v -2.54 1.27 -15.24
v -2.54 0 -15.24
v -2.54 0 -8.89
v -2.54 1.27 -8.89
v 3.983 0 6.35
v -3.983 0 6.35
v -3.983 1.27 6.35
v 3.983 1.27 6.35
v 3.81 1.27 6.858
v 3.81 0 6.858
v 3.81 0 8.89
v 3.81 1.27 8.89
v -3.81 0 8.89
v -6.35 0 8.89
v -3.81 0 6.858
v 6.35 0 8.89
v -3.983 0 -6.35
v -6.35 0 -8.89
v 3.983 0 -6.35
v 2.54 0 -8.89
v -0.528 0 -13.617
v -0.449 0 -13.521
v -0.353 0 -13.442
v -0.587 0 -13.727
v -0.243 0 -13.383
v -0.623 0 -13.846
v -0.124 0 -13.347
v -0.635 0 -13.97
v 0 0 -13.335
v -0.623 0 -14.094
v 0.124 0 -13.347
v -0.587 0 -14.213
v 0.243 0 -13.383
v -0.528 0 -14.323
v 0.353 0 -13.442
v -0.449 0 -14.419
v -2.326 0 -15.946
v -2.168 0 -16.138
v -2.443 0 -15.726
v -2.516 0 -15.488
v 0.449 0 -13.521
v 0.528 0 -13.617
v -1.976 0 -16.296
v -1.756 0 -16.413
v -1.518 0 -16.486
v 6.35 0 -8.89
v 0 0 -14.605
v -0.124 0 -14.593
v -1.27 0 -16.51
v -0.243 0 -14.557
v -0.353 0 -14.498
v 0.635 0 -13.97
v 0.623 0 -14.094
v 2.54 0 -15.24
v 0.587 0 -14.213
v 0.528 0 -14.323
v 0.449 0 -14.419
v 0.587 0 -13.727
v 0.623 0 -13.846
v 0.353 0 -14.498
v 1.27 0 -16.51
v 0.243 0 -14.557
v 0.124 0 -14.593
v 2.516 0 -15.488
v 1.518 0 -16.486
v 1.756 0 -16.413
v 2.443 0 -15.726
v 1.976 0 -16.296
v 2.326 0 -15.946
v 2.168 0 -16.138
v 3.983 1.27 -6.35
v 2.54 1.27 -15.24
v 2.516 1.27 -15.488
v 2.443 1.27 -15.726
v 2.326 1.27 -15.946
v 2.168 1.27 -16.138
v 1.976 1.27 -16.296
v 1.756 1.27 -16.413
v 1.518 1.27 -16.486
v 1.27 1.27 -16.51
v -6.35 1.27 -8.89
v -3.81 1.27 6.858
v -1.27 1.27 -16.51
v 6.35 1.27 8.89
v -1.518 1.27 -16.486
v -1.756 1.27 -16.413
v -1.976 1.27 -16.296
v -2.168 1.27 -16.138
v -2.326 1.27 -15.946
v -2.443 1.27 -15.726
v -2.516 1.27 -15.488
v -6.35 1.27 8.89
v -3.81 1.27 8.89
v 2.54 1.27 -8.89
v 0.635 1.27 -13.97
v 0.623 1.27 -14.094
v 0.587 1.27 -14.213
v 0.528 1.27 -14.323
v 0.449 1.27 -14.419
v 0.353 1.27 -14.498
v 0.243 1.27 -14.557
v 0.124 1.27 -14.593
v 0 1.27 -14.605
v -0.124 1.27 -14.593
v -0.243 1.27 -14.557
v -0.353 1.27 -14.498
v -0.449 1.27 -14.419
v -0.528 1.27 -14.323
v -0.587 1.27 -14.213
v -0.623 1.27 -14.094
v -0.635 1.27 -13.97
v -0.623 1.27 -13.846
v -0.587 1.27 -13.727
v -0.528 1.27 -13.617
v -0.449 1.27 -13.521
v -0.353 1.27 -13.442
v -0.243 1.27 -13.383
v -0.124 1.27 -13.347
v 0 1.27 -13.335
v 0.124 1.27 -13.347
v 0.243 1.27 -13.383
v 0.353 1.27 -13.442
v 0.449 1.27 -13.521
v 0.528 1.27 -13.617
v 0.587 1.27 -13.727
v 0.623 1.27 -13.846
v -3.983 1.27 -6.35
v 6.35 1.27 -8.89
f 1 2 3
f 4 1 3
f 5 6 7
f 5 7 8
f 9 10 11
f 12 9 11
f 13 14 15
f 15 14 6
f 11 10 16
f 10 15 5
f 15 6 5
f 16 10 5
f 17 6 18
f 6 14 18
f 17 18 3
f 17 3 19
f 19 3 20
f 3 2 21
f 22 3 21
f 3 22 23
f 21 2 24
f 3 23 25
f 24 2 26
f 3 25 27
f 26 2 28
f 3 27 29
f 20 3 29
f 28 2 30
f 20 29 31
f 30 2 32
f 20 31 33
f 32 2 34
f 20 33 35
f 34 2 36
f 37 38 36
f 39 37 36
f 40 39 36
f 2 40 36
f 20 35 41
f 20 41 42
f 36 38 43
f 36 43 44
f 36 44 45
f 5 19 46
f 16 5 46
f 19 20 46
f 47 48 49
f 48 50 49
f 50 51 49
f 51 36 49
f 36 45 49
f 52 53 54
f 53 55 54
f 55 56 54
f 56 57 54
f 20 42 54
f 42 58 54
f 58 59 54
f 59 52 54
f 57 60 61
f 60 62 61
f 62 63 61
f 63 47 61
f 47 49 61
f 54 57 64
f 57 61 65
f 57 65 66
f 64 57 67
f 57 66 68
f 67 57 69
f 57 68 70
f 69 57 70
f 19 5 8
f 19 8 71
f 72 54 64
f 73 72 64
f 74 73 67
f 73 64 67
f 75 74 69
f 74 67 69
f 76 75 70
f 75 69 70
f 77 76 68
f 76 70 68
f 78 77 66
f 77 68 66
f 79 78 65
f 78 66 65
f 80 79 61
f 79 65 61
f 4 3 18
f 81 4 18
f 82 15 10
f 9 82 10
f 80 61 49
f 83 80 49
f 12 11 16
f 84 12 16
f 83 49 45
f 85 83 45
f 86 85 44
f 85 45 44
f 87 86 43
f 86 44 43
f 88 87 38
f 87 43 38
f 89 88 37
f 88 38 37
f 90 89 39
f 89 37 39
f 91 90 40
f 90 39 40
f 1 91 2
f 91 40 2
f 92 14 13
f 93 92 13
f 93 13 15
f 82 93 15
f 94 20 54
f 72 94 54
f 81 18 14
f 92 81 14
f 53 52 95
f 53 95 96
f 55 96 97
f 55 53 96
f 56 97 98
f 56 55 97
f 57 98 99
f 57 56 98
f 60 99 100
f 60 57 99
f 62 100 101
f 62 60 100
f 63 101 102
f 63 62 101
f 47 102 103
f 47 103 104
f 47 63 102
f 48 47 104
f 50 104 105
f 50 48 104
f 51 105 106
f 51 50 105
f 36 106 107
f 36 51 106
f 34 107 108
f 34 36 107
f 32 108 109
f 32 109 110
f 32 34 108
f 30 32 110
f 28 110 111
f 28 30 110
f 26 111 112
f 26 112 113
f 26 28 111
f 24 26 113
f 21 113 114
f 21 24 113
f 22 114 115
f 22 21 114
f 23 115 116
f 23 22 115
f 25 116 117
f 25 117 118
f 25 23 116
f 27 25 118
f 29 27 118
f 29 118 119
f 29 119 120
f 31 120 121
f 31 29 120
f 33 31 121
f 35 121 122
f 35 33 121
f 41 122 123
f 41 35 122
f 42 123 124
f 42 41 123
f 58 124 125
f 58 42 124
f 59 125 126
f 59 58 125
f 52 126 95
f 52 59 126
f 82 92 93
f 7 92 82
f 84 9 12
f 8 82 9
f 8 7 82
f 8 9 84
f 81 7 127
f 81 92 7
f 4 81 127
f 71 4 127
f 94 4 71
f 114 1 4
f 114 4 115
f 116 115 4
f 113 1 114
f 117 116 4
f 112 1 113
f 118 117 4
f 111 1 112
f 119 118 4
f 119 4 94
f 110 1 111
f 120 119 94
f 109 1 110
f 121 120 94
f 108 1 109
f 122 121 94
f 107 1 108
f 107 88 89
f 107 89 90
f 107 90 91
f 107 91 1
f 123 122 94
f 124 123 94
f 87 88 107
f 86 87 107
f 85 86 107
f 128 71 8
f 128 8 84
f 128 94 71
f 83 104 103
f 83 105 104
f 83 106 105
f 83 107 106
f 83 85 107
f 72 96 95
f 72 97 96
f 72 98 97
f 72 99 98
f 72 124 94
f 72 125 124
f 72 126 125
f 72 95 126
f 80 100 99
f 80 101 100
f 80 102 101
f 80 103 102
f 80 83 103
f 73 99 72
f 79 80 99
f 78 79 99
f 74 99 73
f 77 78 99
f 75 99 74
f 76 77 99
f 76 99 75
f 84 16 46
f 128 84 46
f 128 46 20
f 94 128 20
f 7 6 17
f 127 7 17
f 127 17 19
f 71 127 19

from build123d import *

# Parameters (mm, degrees)
SKETCH1_R           = 0.635
SKETCH1_W           = 7.96592112
SKETCH1_H           = 12.7
BOSS_EXTRUDE1_DEPTH = 1.27


with BuildPart() as part:
    # Sketch1 → Boss-Extrude1 (new body)
    with BuildSketch(Plane(origin=(0, 0, 0), x_dir=(1, 0, 0), z_dir=(0, 1, 0))):
        with BuildLine():
            Line((6.35, -8.89), (6.35, 8.89))
            Line((6.35, 8.89), (2.54, 8.89))
            Line((2.54, 8.89), (2.54, 15.24))
            ThreePointArc((2.54, 15.24), (2.168025612, 16.138025612), (1.27, 16.51))
            Line((1.27, 16.51), (-1.27, 16.51))
            ThreePointArc((-1.27, 16.51), (-2.168025612, 16.138025612), (-2.54, 15.24))
            Line((-2.54, 15.24), (-2.54, 8.89))
            Line((-2.54, 8.89), (-6.35, 8.89))
            Line((-6.35, 8.89), (-6.35, -8.89))
            Line((-6.35, -8.89), (-3.81, -8.89))
            Line((-3.81, -8.89), (-3.81, -6.858))
            Line((-3.81, -6.858), (3.81, -6.858))
            Line((3.81, -6.858), (3.81, -8.89))
            Line((3.81, -8.89), (6.35, -8.89))
        make_face()
        with Locations((0, 13.97)):
            Circle(SKETCH1_R, mode=Mode.SUBTRACT)
        Rectangle(SKETCH1_W, SKETCH1_H, mode=Mode.SUBTRACT)
    extrude(amount=BOSS_EXTRUDE1_DEPTH)


solid = part.part
